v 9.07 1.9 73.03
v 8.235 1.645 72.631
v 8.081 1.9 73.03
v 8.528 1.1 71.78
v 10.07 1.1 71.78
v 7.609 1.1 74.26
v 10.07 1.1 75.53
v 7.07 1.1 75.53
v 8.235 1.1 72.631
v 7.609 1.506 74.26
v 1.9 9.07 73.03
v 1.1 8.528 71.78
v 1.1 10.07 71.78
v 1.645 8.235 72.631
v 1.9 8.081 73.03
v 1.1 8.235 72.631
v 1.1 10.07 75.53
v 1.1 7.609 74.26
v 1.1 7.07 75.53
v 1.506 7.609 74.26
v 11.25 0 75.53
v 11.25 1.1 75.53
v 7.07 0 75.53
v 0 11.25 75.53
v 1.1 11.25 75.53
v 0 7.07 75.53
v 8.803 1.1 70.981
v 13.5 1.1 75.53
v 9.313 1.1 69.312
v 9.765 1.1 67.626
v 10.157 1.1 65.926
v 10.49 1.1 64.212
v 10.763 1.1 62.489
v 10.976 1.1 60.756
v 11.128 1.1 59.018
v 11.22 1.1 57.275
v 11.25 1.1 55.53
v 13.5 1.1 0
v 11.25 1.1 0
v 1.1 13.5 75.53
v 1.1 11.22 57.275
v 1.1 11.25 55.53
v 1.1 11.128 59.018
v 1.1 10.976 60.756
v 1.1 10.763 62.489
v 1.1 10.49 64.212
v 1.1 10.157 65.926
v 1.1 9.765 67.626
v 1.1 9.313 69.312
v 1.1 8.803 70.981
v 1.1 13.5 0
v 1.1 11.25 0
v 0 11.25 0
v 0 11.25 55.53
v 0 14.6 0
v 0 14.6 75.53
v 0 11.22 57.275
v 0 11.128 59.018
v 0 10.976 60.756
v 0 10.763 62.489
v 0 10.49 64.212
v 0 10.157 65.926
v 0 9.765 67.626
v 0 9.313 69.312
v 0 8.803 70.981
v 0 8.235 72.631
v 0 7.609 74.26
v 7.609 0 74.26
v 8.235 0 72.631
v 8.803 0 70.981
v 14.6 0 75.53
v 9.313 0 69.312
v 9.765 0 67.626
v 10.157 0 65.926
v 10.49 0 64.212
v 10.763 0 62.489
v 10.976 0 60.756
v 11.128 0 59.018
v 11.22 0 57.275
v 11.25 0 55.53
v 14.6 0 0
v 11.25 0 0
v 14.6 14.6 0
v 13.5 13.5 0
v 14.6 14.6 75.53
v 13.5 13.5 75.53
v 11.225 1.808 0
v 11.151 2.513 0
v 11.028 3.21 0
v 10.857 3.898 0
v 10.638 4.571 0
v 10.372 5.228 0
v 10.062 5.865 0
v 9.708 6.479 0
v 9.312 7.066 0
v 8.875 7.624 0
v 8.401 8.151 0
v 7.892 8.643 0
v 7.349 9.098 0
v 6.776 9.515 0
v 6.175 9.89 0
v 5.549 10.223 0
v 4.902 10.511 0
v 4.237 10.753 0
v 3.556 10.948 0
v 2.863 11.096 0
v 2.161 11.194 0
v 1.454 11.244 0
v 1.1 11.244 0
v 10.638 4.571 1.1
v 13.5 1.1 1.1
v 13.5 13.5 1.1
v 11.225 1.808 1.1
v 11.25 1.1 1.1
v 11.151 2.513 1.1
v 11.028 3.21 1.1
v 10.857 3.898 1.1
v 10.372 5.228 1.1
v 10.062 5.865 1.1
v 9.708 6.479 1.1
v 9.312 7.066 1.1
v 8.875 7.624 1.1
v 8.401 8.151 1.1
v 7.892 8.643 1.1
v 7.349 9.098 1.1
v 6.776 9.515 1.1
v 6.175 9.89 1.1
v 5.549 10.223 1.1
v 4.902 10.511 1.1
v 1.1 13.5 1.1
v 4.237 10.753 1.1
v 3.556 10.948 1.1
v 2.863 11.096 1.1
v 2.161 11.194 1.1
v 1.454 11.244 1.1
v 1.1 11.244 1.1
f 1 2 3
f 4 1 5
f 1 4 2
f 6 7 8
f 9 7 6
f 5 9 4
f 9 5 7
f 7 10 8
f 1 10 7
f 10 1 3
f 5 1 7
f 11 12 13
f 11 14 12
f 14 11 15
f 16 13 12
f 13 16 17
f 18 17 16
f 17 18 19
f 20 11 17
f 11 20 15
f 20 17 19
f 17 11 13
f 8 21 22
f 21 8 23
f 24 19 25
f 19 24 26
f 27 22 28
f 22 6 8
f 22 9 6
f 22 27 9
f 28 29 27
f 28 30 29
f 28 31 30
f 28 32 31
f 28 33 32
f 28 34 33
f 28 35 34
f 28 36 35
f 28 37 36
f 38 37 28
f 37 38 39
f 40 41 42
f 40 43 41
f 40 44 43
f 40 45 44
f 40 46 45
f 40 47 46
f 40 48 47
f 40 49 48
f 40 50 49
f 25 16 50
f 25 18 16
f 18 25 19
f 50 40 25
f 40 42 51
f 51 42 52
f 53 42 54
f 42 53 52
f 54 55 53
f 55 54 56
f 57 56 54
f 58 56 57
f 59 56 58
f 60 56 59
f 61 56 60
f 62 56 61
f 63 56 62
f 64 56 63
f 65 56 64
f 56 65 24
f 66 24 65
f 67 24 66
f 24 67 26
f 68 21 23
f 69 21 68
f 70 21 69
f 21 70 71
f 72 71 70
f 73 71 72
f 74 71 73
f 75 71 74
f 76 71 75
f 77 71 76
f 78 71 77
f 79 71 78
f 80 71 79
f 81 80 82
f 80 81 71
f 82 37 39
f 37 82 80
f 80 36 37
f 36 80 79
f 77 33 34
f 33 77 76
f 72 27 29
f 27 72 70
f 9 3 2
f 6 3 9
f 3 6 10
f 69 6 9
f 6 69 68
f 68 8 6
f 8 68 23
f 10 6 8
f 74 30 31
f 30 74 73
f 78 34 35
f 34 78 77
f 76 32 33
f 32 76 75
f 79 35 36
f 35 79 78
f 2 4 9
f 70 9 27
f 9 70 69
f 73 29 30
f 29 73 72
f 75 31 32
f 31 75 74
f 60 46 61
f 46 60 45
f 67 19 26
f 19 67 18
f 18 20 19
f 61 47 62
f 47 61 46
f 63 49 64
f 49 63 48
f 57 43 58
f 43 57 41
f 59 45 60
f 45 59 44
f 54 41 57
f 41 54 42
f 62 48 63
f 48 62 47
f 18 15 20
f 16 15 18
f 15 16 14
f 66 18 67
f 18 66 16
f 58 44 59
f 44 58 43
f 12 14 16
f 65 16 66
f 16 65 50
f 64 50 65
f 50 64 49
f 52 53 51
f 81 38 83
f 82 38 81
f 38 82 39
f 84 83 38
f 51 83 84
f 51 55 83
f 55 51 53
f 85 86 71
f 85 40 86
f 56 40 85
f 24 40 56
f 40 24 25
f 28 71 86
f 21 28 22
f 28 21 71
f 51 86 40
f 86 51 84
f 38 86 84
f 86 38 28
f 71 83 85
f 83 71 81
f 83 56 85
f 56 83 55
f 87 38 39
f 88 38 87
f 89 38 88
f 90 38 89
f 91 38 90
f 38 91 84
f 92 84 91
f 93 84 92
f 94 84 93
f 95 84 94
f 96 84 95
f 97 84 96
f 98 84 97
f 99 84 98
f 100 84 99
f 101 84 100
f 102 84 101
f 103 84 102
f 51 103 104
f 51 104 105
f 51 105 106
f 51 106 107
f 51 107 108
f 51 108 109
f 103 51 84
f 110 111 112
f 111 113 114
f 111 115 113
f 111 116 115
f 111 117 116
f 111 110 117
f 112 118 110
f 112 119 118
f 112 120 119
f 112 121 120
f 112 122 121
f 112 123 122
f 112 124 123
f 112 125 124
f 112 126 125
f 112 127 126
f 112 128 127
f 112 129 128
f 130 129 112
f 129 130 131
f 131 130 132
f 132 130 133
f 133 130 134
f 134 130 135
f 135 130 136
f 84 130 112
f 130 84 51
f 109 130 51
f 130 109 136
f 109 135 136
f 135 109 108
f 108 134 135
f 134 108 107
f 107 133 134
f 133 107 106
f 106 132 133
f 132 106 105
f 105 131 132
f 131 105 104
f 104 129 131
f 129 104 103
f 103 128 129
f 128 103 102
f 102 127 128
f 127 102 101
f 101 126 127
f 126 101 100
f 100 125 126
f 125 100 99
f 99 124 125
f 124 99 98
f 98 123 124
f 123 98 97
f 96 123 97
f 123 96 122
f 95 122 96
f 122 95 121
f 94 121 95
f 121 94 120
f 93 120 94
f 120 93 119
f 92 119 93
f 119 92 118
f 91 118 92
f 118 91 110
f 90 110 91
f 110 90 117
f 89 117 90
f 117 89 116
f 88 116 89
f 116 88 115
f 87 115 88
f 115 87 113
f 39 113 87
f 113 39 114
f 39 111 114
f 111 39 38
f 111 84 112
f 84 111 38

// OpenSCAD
/*
A small part which securely stores and conveniently dispenses 6-sided dice.

Default configuration holds 6 Chessex 12mm dice, but the design is parameterized to
easily allow for other amounts of dice, or to use different dice sizes or tolerances with
a little more effort.
*/

// Number of dice to generate for
num_dice = 6;

// Dimensions of the dice, with tolerance
die_width = 12.40;
die_height = 11.93;

// Thickness of all body walls
wall_thick = 1.1;

// Width of the walls that hold the dice in
retainer_width = 2.25;

// Size of the detent "bump" holding the dice in
detent_height = 3.75;
detent_middle = 1.25;
detent_depth = 0.8;
detent_width = 3;

// Size of the slots either side of the detent
cutout_width = 0.5;
cutout_height = 8;
cutout_radius = 40;
cutout_angle = 16; // Portion of circle to use for cutouts, in degrees

// Space above the top of the last die; used to align the detent
ramp_height = 2.85;

// Total height and radius to use for "lips" that constrict toward the opening
lip_radius = 50;
lip_height = 20;

// Tolerance value to avoid floating point errors in render
epsil = 0.001;


module body() {
    linear_extrude(wall_thick + num_dice * die_height + ramp_height) {
        difference() {
            square(die_width + 2*wall_thick);
            translate([wall_thick, wall_thick]) {
                square(die_width);
            }
            square(die_width + wall_thick - retainer_width);
        }
    }
}

module cap() {
    linear_extrude(wall_thick) {
        translate([wall_thick, wall_thick]) {
            difference() {
                square(die_width);
                circle(die_width - retainer_width, $fn=90);
            }
        }
    }
}

module detent() {
  intersection() {
    // This gets rotated into -x,-y...
    rotate(-90, [0,0,1]) {
        rotate(90, [1,0,0]) {
            linear_extrude(detent_width) {
                polygon([
                    [0,0],
                    [detent_depth,detent_middle],
                    [0,detent_height]
                ]);
            }
        }
    }
    linear_extrude(detent_height) {
      polygon([
        [0,0],
        [-detent_width,0],
        [-(detent_width-detent_depth*1.25),-detent_depth],
        [0,-detent_depth]
      ]);
    }
  }
}

module pos_detent() {
  translate([wall_thick+die_width-6.43,wall_thick,lip_height-detent_height]) {
    rotate(180, [0,0,1]) detent();
  }
}


module lips_cyl() {
    translate([0, -epsil, 0]) {
        rotate(-90, [1,0,0]) {
            linear_extrude(wall_thick + detent_depth + 2*epsil) {
                translate([-lip_radius + die_width + wall_thick - retainer_width, 0, 0]) {
                    circle(lip_radius, $fn=180);
                }
            }
        }
    }
}

module lips() {
    difference() {
      union() {
        linear_extrude(lip_height) {
            difference() {
                square(wall_thick + die_width - retainer_width);
                translate([wall_thick, wall_thick]) {
                    square(die_width);
                }
            }
        }
        pos_detent();
        mirror([1,-1,0]) pos_detent();
      }
      lips_cyl();
      mirror([1,-1,0]) lips_cyl();
    }
}

module cutouts() {
    translate([0,0,-cutout_height-ramp_height]) {
        cube([cutout_width, wall_thick + 2*epsil, cutout_height + ramp_height]);
        translate([cutout_width + detent_width, 0, 0]) {
            cube([cutout_width, wall_thick + 2*epsil, cutout_height + ramp_height]);
        }
    }
}

module round_cutouts() {
    rotate(-90, [1,0,0]) {
        linear_extrude(wall_thick + 2*epsil) {
            translate([-cutout_radius+cutout_width, 0]) {
                intersection() {
                    difference() {
                        circle(cutout_radius, $fn=90);
                        circle(cutout_radius-cutout_width, $fn=90);
                    }
                    polygon([
                        [0,0],
                        [999*cos(cutout_angle),999*sin(cutout_angle)],
                        [999,0]
                    ]);
                }
            }
            translate([cutout_radius+detent_width+cutout_width, 0]) {
                intersection() {
                    difference() {
                        circle(cutout_radius, $fn=90);
                        circle(cutout_radius-cutout_width, $fn=90);
                    }
                    polygon([
                        [0,0],
                        [-999*cos(cutout_angle),999*sin(cutout_angle)],
                        [-999,0]
                    ]);
                }
            }
        }
    }
}

module holder() {
    // Align and put together all the bits
    difference() {
        union() {
            body();
            cap();
            translate([
                (wall_thick*2 + die_width + detent_width)/2,
                wall_thick + die_width,
                wall_thick + num_dice*die_height + ramp_height - detent_height
            ]) {
                // detent();
            }
            translate([0, 0, wall_thick + num_dice*die_height + ramp_height - lip_height]) {
                lips();
            }
        }
        translate([
            wall_thick + (die_width - detent_width)/2 - cutout_width,
            wall_thick + die_width - epsil,
            wall_thick + die_height*num_dice + ramp_height + epsil
        ]) {
          union() {
            //cutouts();
            //round_cutouts();
          }
        }
    }
}

module on_axis_holder() {
    translate([-1.5*wall_thick - die_width, -1.5*wall_thick - die_width, 0]) {
        holder();
    }
}

module triholder() {
    on_axis_holder();
    rotate(120, [0,0,1]) {
        on_axis_holder();
    }
    rotate(-120, [0,0,1]) {
        on_axis_holder();
    } 
}

render(convexity=8) {
  holder();
}
